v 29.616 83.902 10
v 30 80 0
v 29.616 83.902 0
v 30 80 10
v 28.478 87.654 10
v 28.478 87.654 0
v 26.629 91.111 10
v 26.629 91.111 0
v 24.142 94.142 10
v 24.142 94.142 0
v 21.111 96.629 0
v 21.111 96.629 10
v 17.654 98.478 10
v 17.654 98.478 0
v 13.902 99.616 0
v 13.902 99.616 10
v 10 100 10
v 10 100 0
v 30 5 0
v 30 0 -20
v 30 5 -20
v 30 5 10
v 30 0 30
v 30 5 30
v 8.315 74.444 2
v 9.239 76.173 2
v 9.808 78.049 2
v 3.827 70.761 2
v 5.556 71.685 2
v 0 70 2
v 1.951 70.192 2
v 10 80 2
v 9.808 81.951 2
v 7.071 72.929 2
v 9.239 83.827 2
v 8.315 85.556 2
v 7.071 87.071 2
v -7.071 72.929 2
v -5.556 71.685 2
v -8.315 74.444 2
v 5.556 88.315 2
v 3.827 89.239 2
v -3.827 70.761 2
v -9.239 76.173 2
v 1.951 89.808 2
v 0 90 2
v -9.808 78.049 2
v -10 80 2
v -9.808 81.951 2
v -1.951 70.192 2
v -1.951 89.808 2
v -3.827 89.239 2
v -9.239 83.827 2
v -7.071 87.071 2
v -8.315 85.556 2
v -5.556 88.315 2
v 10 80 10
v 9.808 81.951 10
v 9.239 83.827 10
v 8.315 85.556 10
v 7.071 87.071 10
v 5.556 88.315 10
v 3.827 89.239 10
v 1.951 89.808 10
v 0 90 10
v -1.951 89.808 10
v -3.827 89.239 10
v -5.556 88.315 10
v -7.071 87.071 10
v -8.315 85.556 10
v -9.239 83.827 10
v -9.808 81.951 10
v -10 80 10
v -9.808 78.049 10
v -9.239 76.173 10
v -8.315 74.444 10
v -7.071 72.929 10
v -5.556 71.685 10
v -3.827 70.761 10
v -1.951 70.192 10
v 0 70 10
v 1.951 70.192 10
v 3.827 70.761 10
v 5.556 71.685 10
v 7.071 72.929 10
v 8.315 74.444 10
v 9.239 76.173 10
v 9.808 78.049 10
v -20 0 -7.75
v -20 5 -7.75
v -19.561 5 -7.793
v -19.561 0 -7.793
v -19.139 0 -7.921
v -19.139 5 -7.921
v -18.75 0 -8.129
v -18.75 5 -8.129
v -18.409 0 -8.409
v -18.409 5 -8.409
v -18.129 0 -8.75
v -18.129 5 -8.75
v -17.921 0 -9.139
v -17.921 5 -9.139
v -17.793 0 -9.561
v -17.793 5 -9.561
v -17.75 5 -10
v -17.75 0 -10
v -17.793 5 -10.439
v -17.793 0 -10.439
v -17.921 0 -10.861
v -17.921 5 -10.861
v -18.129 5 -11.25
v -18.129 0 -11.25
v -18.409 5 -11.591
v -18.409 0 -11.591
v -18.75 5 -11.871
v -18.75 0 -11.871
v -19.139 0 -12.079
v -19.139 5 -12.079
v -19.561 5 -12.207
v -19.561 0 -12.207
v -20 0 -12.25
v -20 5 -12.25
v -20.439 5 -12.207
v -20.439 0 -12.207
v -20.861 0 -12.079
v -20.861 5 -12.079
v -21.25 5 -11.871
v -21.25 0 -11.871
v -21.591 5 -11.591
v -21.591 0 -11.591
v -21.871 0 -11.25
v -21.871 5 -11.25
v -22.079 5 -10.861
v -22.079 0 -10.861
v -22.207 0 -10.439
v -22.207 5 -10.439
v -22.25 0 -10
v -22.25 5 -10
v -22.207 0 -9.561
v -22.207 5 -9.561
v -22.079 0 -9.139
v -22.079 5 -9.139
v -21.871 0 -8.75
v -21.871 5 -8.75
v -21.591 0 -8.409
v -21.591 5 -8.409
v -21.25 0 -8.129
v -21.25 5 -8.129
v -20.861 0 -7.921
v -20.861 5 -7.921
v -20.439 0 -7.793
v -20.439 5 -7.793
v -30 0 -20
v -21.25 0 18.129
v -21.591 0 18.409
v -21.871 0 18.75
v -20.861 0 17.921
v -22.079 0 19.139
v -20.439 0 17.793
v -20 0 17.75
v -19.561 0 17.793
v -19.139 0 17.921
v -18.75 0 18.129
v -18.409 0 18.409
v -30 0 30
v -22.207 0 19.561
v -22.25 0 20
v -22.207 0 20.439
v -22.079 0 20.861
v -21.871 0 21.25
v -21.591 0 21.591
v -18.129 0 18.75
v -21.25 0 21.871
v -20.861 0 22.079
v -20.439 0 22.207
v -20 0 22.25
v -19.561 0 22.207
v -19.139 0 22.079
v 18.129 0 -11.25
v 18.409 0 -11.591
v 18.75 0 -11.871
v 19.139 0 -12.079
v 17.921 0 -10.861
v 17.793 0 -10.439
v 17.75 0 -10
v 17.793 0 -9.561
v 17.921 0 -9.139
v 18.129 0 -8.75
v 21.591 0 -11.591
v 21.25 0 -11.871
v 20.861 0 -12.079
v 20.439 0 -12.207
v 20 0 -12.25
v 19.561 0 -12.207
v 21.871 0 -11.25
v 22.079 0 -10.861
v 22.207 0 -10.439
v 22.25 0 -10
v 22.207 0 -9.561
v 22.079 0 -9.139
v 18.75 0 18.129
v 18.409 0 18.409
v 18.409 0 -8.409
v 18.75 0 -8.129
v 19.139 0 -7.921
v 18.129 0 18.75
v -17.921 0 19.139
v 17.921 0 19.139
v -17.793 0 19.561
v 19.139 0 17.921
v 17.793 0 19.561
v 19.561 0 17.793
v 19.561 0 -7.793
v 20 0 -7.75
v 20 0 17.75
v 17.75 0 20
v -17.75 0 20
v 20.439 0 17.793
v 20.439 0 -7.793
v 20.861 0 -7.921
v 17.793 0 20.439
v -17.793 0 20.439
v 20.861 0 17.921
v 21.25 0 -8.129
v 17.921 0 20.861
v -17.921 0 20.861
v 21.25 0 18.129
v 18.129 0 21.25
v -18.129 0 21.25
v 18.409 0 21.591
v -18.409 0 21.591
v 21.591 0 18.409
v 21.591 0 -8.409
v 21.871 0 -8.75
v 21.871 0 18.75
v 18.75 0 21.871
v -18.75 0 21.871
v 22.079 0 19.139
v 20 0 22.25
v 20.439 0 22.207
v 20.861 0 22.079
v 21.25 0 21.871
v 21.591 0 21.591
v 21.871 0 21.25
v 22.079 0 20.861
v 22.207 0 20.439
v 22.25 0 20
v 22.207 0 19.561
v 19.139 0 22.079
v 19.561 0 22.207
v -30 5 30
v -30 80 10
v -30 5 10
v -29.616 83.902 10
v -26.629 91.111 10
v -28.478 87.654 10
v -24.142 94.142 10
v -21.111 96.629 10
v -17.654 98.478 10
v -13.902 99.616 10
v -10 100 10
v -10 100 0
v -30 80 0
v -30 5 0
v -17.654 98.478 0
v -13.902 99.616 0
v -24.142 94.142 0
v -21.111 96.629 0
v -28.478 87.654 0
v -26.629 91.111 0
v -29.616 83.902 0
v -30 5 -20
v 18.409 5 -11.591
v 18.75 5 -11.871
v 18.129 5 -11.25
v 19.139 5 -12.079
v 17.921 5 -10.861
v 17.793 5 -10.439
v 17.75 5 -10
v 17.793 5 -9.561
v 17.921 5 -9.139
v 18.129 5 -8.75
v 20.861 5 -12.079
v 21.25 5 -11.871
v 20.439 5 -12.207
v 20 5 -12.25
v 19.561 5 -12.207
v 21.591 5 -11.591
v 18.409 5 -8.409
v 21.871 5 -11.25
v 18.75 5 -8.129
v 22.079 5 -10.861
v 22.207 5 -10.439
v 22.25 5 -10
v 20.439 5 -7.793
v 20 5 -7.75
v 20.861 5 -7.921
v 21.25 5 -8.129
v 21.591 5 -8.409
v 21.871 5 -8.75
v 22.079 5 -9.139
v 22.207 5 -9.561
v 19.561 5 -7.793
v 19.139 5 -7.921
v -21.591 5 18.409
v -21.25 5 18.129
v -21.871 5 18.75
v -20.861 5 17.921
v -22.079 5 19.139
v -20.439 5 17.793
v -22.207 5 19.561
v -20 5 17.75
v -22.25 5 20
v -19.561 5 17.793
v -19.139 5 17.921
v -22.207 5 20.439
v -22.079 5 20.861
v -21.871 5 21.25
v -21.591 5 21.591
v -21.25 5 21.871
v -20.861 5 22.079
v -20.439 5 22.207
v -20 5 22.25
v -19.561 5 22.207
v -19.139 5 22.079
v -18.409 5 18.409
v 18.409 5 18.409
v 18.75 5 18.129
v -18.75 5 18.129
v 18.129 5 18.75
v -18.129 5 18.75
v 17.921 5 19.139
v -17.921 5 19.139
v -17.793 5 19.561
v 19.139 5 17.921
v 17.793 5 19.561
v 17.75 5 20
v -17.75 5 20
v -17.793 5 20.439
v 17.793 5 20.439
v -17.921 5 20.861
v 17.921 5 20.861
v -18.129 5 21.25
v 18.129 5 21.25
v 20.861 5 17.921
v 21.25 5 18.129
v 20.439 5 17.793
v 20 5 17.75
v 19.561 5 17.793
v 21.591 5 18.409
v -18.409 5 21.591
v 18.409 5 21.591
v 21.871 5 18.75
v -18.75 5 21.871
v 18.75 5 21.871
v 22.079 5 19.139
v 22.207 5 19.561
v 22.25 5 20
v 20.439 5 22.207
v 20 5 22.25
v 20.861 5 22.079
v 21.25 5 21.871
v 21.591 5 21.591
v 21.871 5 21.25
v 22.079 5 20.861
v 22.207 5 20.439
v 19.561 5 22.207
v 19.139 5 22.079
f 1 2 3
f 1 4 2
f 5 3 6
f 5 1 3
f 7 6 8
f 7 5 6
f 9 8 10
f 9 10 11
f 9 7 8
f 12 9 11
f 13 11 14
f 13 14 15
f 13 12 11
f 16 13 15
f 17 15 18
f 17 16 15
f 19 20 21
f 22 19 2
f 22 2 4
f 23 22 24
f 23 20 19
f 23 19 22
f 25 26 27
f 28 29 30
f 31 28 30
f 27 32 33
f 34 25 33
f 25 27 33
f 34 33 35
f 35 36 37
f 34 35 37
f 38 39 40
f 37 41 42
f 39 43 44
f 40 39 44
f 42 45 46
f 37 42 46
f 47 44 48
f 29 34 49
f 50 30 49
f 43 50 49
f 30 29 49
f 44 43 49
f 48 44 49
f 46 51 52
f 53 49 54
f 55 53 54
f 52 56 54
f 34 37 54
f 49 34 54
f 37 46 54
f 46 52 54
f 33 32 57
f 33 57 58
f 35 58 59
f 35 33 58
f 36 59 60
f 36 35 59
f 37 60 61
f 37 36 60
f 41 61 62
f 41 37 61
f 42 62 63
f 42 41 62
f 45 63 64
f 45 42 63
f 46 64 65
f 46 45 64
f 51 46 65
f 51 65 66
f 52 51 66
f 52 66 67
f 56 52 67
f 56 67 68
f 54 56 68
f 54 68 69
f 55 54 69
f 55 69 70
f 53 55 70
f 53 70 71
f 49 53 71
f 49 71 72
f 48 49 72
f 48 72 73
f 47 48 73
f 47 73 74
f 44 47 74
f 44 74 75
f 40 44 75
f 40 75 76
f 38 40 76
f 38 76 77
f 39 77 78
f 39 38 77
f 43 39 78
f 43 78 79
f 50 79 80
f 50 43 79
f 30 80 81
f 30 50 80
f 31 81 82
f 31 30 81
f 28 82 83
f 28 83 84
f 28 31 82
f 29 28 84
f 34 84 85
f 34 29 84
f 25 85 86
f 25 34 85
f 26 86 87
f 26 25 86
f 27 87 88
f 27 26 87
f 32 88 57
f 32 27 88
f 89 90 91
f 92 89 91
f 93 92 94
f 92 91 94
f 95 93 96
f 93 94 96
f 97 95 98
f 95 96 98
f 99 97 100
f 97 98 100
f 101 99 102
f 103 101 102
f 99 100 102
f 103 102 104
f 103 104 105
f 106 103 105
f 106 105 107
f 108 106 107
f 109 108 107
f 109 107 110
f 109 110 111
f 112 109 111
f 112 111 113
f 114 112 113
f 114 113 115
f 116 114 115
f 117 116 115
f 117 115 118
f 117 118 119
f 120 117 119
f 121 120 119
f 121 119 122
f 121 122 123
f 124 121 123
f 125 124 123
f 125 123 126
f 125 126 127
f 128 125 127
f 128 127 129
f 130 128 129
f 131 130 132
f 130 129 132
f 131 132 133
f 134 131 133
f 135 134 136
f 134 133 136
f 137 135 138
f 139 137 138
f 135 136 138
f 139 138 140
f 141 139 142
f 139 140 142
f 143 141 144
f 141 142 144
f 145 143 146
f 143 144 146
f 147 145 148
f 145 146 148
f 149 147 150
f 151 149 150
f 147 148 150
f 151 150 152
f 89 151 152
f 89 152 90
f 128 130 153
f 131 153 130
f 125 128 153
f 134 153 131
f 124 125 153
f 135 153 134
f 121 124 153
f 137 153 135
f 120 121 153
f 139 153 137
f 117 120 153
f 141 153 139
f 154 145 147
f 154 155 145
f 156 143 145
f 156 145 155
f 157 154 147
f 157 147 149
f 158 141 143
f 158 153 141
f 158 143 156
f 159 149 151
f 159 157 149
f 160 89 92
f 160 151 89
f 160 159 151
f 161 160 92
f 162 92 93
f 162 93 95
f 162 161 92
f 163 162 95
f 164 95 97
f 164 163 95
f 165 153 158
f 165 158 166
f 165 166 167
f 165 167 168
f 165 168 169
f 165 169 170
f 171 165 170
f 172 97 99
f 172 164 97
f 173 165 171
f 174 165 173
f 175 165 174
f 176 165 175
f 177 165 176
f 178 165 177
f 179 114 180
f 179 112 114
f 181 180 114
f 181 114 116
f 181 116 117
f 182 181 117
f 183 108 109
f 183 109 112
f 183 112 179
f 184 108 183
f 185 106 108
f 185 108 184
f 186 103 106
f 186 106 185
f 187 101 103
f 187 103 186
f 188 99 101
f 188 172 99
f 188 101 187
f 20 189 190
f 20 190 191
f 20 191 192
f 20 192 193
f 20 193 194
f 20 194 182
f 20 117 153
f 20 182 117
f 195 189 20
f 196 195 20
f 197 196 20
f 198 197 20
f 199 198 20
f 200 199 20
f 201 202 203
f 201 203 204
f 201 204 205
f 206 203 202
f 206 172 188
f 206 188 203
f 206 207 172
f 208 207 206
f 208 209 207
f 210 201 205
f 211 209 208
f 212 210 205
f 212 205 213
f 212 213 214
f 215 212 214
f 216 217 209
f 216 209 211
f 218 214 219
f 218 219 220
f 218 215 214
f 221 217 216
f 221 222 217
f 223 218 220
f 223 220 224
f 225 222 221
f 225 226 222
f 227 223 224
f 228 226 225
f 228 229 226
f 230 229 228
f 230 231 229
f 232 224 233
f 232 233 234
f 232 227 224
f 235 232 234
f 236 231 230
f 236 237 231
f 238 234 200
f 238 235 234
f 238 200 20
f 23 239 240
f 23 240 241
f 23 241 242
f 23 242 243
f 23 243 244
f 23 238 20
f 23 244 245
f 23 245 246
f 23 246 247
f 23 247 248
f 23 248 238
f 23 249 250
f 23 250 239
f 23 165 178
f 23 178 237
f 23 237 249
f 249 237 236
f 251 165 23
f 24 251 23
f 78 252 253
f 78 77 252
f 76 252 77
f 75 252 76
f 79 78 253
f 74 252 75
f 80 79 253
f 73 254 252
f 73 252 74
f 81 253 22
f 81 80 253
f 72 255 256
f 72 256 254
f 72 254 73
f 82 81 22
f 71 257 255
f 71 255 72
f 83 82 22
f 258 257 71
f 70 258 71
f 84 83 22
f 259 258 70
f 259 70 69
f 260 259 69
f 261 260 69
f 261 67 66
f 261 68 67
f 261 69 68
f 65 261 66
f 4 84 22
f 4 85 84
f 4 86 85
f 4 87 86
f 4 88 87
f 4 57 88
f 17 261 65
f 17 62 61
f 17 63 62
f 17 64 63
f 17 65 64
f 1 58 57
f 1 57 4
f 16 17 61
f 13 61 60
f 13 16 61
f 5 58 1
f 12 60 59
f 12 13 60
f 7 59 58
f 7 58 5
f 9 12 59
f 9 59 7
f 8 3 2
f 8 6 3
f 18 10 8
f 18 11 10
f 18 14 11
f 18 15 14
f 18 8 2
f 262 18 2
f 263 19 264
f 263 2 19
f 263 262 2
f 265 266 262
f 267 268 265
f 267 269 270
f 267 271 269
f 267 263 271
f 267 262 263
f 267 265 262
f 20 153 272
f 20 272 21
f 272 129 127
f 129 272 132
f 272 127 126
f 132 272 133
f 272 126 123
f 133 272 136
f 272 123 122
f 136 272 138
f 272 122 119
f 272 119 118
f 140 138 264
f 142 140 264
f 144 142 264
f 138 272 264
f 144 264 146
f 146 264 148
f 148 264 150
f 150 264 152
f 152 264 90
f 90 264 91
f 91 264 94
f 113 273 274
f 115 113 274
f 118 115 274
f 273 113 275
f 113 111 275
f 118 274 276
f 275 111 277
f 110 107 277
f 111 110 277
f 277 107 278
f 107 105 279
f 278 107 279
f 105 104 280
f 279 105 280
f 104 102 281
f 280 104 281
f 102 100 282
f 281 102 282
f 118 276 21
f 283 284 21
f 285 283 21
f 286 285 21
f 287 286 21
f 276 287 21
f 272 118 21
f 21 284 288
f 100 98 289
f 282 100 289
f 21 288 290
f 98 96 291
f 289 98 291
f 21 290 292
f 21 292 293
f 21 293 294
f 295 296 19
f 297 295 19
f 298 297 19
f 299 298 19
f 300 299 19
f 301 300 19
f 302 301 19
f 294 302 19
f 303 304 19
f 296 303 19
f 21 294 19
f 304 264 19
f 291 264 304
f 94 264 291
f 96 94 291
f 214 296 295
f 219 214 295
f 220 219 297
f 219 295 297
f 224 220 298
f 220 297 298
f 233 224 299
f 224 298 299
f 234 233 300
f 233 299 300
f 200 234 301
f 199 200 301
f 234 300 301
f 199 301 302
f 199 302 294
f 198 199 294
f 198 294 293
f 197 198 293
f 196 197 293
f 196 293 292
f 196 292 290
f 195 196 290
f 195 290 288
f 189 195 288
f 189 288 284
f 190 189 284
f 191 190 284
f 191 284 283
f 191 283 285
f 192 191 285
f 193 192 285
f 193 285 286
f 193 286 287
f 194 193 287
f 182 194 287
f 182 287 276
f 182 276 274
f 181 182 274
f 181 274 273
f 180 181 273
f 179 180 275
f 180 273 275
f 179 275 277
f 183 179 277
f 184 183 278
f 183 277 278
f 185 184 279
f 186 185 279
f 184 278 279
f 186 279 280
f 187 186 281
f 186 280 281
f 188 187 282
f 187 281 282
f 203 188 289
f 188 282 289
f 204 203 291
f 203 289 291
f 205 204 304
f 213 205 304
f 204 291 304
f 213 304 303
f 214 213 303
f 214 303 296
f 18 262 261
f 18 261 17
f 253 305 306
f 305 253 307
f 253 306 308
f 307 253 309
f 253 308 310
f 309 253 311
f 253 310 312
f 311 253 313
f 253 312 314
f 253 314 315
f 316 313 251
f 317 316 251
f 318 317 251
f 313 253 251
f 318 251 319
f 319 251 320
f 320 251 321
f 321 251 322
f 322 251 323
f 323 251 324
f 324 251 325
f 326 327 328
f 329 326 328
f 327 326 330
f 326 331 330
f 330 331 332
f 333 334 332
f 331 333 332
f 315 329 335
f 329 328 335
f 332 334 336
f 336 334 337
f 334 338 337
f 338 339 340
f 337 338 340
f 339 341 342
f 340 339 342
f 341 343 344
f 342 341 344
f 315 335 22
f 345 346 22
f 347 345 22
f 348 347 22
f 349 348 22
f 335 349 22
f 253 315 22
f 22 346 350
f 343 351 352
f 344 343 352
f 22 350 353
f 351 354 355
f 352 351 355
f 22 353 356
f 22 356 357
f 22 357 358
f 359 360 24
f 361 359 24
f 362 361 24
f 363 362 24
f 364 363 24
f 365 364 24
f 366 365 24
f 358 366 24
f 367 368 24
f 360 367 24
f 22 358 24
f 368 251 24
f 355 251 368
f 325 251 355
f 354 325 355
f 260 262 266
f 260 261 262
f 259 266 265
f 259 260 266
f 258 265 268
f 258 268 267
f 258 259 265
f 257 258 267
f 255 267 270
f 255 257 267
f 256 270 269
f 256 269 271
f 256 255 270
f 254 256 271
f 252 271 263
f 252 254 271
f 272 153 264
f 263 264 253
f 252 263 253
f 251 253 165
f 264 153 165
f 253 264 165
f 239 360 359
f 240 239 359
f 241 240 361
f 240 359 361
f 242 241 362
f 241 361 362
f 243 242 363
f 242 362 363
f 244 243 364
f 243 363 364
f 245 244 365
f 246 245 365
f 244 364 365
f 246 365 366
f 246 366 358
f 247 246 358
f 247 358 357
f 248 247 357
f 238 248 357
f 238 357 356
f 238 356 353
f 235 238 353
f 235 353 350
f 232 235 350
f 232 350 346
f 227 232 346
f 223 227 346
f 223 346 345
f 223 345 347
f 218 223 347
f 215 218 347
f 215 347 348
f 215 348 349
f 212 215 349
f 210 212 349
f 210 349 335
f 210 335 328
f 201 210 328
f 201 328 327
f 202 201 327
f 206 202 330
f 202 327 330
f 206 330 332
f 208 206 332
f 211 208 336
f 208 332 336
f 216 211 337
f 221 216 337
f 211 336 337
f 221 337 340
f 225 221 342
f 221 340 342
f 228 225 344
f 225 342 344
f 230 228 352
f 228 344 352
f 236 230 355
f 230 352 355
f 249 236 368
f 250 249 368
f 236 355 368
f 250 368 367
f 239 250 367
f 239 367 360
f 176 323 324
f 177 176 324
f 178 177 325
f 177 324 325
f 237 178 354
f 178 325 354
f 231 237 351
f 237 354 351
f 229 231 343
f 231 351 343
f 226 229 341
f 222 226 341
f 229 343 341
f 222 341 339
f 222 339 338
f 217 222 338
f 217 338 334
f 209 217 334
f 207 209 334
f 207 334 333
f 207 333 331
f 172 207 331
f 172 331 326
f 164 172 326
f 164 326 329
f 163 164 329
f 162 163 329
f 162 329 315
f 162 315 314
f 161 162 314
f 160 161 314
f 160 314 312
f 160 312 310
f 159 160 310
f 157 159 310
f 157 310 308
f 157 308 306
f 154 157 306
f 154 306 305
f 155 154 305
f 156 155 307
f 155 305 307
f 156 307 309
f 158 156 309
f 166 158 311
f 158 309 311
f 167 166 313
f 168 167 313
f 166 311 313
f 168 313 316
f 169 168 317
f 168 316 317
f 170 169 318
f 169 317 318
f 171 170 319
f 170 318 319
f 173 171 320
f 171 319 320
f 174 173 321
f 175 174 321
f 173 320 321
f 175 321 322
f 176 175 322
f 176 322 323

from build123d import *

# Parameters (mm, degrees)
SKETCH_1_W          = 60
SKETCH_1_H          = 100
SKETCH_1_R          = 10
EXTRUDE_1_DEPTH     = 10
SKETCH_2_R          = 10
EXTRUDE_2_DEPTH     = 2
FILLET_1_R          = 20
SKETCH_3_W          = 60
SKETCH_3_H          = 50
EXTRUDE_3_DEPTH     = 5
SKETCH_4_R          = 2.25
CUT_EXTRUDE_1_DEPTH = 105.043260233


with BuildPart() as part:
    # 草图1 → 凸台-拉伸1 (new body)
    with BuildSketch(Plane.XY):
        with Locations((0, 50)):
            Rectangle(SKETCH_1_W, SKETCH_1_H)
        with Locations((0, 80)):
            Circle(SKETCH_1_R, mode=Mode.SUBTRACT)
    extrude(amount=EXTRUDE_1_DEPTH)

    # 草图2 → 凸台-拉伸2 (add)
    with BuildSketch(Plane(origin=(0, 0, 0), x_dir=(-1, 0, 0), z_dir=(0, 0, -1))):
        with Locations((0, 80)):
            Circle(SKETCH_2_R)
    extrude(amount=-EXTRUDE_2_DEPTH)

    # 圆角1
    fillet_1_edges = [part.edges().sort_by_distance(p)[0] for p in [
        (-30, 100, 5),
        (30, 100, 5),
    ]]
    fillet(fillet_1_edges, radius=FILLET_1_R)

    # 草图3 → 凸台-拉伸3 (add)
    with BuildSketch(Plane.XZ):
        with Locations((0, 5)):
            Rectangle(SKETCH_3_W, SKETCH_3_H)
    extrude(amount=-EXTRUDE_3_DEPTH)

    # 草图4 → 切除-拉伸1 (cut, through all)
    with BuildSketch(Plane(origin=(0, 5, 0), x_dir=(1, 0, 0), z_dir=(0, 1, 0))):
        with Locations(Location((-20, 10, 0), (0, 0, 270))):
            Circle(SKETCH_4_R)
        with Locations(Location((20, 10, 0), (0, 0, 270))):
            Circle(SKETCH_4_R)
        with Locations(Location((-20, -20, 0), (0, 0, 270))):
            Circle(SKETCH_4_R)
        with Locations(Location((20, -20, 0), (0, 0, 270))):
            Circle(SKETCH_4_R)
    extrude(amount=-CUT_EXTRUDE_1_DEPTH, mode=Mode.SUBTRACT)


solid = part.part
